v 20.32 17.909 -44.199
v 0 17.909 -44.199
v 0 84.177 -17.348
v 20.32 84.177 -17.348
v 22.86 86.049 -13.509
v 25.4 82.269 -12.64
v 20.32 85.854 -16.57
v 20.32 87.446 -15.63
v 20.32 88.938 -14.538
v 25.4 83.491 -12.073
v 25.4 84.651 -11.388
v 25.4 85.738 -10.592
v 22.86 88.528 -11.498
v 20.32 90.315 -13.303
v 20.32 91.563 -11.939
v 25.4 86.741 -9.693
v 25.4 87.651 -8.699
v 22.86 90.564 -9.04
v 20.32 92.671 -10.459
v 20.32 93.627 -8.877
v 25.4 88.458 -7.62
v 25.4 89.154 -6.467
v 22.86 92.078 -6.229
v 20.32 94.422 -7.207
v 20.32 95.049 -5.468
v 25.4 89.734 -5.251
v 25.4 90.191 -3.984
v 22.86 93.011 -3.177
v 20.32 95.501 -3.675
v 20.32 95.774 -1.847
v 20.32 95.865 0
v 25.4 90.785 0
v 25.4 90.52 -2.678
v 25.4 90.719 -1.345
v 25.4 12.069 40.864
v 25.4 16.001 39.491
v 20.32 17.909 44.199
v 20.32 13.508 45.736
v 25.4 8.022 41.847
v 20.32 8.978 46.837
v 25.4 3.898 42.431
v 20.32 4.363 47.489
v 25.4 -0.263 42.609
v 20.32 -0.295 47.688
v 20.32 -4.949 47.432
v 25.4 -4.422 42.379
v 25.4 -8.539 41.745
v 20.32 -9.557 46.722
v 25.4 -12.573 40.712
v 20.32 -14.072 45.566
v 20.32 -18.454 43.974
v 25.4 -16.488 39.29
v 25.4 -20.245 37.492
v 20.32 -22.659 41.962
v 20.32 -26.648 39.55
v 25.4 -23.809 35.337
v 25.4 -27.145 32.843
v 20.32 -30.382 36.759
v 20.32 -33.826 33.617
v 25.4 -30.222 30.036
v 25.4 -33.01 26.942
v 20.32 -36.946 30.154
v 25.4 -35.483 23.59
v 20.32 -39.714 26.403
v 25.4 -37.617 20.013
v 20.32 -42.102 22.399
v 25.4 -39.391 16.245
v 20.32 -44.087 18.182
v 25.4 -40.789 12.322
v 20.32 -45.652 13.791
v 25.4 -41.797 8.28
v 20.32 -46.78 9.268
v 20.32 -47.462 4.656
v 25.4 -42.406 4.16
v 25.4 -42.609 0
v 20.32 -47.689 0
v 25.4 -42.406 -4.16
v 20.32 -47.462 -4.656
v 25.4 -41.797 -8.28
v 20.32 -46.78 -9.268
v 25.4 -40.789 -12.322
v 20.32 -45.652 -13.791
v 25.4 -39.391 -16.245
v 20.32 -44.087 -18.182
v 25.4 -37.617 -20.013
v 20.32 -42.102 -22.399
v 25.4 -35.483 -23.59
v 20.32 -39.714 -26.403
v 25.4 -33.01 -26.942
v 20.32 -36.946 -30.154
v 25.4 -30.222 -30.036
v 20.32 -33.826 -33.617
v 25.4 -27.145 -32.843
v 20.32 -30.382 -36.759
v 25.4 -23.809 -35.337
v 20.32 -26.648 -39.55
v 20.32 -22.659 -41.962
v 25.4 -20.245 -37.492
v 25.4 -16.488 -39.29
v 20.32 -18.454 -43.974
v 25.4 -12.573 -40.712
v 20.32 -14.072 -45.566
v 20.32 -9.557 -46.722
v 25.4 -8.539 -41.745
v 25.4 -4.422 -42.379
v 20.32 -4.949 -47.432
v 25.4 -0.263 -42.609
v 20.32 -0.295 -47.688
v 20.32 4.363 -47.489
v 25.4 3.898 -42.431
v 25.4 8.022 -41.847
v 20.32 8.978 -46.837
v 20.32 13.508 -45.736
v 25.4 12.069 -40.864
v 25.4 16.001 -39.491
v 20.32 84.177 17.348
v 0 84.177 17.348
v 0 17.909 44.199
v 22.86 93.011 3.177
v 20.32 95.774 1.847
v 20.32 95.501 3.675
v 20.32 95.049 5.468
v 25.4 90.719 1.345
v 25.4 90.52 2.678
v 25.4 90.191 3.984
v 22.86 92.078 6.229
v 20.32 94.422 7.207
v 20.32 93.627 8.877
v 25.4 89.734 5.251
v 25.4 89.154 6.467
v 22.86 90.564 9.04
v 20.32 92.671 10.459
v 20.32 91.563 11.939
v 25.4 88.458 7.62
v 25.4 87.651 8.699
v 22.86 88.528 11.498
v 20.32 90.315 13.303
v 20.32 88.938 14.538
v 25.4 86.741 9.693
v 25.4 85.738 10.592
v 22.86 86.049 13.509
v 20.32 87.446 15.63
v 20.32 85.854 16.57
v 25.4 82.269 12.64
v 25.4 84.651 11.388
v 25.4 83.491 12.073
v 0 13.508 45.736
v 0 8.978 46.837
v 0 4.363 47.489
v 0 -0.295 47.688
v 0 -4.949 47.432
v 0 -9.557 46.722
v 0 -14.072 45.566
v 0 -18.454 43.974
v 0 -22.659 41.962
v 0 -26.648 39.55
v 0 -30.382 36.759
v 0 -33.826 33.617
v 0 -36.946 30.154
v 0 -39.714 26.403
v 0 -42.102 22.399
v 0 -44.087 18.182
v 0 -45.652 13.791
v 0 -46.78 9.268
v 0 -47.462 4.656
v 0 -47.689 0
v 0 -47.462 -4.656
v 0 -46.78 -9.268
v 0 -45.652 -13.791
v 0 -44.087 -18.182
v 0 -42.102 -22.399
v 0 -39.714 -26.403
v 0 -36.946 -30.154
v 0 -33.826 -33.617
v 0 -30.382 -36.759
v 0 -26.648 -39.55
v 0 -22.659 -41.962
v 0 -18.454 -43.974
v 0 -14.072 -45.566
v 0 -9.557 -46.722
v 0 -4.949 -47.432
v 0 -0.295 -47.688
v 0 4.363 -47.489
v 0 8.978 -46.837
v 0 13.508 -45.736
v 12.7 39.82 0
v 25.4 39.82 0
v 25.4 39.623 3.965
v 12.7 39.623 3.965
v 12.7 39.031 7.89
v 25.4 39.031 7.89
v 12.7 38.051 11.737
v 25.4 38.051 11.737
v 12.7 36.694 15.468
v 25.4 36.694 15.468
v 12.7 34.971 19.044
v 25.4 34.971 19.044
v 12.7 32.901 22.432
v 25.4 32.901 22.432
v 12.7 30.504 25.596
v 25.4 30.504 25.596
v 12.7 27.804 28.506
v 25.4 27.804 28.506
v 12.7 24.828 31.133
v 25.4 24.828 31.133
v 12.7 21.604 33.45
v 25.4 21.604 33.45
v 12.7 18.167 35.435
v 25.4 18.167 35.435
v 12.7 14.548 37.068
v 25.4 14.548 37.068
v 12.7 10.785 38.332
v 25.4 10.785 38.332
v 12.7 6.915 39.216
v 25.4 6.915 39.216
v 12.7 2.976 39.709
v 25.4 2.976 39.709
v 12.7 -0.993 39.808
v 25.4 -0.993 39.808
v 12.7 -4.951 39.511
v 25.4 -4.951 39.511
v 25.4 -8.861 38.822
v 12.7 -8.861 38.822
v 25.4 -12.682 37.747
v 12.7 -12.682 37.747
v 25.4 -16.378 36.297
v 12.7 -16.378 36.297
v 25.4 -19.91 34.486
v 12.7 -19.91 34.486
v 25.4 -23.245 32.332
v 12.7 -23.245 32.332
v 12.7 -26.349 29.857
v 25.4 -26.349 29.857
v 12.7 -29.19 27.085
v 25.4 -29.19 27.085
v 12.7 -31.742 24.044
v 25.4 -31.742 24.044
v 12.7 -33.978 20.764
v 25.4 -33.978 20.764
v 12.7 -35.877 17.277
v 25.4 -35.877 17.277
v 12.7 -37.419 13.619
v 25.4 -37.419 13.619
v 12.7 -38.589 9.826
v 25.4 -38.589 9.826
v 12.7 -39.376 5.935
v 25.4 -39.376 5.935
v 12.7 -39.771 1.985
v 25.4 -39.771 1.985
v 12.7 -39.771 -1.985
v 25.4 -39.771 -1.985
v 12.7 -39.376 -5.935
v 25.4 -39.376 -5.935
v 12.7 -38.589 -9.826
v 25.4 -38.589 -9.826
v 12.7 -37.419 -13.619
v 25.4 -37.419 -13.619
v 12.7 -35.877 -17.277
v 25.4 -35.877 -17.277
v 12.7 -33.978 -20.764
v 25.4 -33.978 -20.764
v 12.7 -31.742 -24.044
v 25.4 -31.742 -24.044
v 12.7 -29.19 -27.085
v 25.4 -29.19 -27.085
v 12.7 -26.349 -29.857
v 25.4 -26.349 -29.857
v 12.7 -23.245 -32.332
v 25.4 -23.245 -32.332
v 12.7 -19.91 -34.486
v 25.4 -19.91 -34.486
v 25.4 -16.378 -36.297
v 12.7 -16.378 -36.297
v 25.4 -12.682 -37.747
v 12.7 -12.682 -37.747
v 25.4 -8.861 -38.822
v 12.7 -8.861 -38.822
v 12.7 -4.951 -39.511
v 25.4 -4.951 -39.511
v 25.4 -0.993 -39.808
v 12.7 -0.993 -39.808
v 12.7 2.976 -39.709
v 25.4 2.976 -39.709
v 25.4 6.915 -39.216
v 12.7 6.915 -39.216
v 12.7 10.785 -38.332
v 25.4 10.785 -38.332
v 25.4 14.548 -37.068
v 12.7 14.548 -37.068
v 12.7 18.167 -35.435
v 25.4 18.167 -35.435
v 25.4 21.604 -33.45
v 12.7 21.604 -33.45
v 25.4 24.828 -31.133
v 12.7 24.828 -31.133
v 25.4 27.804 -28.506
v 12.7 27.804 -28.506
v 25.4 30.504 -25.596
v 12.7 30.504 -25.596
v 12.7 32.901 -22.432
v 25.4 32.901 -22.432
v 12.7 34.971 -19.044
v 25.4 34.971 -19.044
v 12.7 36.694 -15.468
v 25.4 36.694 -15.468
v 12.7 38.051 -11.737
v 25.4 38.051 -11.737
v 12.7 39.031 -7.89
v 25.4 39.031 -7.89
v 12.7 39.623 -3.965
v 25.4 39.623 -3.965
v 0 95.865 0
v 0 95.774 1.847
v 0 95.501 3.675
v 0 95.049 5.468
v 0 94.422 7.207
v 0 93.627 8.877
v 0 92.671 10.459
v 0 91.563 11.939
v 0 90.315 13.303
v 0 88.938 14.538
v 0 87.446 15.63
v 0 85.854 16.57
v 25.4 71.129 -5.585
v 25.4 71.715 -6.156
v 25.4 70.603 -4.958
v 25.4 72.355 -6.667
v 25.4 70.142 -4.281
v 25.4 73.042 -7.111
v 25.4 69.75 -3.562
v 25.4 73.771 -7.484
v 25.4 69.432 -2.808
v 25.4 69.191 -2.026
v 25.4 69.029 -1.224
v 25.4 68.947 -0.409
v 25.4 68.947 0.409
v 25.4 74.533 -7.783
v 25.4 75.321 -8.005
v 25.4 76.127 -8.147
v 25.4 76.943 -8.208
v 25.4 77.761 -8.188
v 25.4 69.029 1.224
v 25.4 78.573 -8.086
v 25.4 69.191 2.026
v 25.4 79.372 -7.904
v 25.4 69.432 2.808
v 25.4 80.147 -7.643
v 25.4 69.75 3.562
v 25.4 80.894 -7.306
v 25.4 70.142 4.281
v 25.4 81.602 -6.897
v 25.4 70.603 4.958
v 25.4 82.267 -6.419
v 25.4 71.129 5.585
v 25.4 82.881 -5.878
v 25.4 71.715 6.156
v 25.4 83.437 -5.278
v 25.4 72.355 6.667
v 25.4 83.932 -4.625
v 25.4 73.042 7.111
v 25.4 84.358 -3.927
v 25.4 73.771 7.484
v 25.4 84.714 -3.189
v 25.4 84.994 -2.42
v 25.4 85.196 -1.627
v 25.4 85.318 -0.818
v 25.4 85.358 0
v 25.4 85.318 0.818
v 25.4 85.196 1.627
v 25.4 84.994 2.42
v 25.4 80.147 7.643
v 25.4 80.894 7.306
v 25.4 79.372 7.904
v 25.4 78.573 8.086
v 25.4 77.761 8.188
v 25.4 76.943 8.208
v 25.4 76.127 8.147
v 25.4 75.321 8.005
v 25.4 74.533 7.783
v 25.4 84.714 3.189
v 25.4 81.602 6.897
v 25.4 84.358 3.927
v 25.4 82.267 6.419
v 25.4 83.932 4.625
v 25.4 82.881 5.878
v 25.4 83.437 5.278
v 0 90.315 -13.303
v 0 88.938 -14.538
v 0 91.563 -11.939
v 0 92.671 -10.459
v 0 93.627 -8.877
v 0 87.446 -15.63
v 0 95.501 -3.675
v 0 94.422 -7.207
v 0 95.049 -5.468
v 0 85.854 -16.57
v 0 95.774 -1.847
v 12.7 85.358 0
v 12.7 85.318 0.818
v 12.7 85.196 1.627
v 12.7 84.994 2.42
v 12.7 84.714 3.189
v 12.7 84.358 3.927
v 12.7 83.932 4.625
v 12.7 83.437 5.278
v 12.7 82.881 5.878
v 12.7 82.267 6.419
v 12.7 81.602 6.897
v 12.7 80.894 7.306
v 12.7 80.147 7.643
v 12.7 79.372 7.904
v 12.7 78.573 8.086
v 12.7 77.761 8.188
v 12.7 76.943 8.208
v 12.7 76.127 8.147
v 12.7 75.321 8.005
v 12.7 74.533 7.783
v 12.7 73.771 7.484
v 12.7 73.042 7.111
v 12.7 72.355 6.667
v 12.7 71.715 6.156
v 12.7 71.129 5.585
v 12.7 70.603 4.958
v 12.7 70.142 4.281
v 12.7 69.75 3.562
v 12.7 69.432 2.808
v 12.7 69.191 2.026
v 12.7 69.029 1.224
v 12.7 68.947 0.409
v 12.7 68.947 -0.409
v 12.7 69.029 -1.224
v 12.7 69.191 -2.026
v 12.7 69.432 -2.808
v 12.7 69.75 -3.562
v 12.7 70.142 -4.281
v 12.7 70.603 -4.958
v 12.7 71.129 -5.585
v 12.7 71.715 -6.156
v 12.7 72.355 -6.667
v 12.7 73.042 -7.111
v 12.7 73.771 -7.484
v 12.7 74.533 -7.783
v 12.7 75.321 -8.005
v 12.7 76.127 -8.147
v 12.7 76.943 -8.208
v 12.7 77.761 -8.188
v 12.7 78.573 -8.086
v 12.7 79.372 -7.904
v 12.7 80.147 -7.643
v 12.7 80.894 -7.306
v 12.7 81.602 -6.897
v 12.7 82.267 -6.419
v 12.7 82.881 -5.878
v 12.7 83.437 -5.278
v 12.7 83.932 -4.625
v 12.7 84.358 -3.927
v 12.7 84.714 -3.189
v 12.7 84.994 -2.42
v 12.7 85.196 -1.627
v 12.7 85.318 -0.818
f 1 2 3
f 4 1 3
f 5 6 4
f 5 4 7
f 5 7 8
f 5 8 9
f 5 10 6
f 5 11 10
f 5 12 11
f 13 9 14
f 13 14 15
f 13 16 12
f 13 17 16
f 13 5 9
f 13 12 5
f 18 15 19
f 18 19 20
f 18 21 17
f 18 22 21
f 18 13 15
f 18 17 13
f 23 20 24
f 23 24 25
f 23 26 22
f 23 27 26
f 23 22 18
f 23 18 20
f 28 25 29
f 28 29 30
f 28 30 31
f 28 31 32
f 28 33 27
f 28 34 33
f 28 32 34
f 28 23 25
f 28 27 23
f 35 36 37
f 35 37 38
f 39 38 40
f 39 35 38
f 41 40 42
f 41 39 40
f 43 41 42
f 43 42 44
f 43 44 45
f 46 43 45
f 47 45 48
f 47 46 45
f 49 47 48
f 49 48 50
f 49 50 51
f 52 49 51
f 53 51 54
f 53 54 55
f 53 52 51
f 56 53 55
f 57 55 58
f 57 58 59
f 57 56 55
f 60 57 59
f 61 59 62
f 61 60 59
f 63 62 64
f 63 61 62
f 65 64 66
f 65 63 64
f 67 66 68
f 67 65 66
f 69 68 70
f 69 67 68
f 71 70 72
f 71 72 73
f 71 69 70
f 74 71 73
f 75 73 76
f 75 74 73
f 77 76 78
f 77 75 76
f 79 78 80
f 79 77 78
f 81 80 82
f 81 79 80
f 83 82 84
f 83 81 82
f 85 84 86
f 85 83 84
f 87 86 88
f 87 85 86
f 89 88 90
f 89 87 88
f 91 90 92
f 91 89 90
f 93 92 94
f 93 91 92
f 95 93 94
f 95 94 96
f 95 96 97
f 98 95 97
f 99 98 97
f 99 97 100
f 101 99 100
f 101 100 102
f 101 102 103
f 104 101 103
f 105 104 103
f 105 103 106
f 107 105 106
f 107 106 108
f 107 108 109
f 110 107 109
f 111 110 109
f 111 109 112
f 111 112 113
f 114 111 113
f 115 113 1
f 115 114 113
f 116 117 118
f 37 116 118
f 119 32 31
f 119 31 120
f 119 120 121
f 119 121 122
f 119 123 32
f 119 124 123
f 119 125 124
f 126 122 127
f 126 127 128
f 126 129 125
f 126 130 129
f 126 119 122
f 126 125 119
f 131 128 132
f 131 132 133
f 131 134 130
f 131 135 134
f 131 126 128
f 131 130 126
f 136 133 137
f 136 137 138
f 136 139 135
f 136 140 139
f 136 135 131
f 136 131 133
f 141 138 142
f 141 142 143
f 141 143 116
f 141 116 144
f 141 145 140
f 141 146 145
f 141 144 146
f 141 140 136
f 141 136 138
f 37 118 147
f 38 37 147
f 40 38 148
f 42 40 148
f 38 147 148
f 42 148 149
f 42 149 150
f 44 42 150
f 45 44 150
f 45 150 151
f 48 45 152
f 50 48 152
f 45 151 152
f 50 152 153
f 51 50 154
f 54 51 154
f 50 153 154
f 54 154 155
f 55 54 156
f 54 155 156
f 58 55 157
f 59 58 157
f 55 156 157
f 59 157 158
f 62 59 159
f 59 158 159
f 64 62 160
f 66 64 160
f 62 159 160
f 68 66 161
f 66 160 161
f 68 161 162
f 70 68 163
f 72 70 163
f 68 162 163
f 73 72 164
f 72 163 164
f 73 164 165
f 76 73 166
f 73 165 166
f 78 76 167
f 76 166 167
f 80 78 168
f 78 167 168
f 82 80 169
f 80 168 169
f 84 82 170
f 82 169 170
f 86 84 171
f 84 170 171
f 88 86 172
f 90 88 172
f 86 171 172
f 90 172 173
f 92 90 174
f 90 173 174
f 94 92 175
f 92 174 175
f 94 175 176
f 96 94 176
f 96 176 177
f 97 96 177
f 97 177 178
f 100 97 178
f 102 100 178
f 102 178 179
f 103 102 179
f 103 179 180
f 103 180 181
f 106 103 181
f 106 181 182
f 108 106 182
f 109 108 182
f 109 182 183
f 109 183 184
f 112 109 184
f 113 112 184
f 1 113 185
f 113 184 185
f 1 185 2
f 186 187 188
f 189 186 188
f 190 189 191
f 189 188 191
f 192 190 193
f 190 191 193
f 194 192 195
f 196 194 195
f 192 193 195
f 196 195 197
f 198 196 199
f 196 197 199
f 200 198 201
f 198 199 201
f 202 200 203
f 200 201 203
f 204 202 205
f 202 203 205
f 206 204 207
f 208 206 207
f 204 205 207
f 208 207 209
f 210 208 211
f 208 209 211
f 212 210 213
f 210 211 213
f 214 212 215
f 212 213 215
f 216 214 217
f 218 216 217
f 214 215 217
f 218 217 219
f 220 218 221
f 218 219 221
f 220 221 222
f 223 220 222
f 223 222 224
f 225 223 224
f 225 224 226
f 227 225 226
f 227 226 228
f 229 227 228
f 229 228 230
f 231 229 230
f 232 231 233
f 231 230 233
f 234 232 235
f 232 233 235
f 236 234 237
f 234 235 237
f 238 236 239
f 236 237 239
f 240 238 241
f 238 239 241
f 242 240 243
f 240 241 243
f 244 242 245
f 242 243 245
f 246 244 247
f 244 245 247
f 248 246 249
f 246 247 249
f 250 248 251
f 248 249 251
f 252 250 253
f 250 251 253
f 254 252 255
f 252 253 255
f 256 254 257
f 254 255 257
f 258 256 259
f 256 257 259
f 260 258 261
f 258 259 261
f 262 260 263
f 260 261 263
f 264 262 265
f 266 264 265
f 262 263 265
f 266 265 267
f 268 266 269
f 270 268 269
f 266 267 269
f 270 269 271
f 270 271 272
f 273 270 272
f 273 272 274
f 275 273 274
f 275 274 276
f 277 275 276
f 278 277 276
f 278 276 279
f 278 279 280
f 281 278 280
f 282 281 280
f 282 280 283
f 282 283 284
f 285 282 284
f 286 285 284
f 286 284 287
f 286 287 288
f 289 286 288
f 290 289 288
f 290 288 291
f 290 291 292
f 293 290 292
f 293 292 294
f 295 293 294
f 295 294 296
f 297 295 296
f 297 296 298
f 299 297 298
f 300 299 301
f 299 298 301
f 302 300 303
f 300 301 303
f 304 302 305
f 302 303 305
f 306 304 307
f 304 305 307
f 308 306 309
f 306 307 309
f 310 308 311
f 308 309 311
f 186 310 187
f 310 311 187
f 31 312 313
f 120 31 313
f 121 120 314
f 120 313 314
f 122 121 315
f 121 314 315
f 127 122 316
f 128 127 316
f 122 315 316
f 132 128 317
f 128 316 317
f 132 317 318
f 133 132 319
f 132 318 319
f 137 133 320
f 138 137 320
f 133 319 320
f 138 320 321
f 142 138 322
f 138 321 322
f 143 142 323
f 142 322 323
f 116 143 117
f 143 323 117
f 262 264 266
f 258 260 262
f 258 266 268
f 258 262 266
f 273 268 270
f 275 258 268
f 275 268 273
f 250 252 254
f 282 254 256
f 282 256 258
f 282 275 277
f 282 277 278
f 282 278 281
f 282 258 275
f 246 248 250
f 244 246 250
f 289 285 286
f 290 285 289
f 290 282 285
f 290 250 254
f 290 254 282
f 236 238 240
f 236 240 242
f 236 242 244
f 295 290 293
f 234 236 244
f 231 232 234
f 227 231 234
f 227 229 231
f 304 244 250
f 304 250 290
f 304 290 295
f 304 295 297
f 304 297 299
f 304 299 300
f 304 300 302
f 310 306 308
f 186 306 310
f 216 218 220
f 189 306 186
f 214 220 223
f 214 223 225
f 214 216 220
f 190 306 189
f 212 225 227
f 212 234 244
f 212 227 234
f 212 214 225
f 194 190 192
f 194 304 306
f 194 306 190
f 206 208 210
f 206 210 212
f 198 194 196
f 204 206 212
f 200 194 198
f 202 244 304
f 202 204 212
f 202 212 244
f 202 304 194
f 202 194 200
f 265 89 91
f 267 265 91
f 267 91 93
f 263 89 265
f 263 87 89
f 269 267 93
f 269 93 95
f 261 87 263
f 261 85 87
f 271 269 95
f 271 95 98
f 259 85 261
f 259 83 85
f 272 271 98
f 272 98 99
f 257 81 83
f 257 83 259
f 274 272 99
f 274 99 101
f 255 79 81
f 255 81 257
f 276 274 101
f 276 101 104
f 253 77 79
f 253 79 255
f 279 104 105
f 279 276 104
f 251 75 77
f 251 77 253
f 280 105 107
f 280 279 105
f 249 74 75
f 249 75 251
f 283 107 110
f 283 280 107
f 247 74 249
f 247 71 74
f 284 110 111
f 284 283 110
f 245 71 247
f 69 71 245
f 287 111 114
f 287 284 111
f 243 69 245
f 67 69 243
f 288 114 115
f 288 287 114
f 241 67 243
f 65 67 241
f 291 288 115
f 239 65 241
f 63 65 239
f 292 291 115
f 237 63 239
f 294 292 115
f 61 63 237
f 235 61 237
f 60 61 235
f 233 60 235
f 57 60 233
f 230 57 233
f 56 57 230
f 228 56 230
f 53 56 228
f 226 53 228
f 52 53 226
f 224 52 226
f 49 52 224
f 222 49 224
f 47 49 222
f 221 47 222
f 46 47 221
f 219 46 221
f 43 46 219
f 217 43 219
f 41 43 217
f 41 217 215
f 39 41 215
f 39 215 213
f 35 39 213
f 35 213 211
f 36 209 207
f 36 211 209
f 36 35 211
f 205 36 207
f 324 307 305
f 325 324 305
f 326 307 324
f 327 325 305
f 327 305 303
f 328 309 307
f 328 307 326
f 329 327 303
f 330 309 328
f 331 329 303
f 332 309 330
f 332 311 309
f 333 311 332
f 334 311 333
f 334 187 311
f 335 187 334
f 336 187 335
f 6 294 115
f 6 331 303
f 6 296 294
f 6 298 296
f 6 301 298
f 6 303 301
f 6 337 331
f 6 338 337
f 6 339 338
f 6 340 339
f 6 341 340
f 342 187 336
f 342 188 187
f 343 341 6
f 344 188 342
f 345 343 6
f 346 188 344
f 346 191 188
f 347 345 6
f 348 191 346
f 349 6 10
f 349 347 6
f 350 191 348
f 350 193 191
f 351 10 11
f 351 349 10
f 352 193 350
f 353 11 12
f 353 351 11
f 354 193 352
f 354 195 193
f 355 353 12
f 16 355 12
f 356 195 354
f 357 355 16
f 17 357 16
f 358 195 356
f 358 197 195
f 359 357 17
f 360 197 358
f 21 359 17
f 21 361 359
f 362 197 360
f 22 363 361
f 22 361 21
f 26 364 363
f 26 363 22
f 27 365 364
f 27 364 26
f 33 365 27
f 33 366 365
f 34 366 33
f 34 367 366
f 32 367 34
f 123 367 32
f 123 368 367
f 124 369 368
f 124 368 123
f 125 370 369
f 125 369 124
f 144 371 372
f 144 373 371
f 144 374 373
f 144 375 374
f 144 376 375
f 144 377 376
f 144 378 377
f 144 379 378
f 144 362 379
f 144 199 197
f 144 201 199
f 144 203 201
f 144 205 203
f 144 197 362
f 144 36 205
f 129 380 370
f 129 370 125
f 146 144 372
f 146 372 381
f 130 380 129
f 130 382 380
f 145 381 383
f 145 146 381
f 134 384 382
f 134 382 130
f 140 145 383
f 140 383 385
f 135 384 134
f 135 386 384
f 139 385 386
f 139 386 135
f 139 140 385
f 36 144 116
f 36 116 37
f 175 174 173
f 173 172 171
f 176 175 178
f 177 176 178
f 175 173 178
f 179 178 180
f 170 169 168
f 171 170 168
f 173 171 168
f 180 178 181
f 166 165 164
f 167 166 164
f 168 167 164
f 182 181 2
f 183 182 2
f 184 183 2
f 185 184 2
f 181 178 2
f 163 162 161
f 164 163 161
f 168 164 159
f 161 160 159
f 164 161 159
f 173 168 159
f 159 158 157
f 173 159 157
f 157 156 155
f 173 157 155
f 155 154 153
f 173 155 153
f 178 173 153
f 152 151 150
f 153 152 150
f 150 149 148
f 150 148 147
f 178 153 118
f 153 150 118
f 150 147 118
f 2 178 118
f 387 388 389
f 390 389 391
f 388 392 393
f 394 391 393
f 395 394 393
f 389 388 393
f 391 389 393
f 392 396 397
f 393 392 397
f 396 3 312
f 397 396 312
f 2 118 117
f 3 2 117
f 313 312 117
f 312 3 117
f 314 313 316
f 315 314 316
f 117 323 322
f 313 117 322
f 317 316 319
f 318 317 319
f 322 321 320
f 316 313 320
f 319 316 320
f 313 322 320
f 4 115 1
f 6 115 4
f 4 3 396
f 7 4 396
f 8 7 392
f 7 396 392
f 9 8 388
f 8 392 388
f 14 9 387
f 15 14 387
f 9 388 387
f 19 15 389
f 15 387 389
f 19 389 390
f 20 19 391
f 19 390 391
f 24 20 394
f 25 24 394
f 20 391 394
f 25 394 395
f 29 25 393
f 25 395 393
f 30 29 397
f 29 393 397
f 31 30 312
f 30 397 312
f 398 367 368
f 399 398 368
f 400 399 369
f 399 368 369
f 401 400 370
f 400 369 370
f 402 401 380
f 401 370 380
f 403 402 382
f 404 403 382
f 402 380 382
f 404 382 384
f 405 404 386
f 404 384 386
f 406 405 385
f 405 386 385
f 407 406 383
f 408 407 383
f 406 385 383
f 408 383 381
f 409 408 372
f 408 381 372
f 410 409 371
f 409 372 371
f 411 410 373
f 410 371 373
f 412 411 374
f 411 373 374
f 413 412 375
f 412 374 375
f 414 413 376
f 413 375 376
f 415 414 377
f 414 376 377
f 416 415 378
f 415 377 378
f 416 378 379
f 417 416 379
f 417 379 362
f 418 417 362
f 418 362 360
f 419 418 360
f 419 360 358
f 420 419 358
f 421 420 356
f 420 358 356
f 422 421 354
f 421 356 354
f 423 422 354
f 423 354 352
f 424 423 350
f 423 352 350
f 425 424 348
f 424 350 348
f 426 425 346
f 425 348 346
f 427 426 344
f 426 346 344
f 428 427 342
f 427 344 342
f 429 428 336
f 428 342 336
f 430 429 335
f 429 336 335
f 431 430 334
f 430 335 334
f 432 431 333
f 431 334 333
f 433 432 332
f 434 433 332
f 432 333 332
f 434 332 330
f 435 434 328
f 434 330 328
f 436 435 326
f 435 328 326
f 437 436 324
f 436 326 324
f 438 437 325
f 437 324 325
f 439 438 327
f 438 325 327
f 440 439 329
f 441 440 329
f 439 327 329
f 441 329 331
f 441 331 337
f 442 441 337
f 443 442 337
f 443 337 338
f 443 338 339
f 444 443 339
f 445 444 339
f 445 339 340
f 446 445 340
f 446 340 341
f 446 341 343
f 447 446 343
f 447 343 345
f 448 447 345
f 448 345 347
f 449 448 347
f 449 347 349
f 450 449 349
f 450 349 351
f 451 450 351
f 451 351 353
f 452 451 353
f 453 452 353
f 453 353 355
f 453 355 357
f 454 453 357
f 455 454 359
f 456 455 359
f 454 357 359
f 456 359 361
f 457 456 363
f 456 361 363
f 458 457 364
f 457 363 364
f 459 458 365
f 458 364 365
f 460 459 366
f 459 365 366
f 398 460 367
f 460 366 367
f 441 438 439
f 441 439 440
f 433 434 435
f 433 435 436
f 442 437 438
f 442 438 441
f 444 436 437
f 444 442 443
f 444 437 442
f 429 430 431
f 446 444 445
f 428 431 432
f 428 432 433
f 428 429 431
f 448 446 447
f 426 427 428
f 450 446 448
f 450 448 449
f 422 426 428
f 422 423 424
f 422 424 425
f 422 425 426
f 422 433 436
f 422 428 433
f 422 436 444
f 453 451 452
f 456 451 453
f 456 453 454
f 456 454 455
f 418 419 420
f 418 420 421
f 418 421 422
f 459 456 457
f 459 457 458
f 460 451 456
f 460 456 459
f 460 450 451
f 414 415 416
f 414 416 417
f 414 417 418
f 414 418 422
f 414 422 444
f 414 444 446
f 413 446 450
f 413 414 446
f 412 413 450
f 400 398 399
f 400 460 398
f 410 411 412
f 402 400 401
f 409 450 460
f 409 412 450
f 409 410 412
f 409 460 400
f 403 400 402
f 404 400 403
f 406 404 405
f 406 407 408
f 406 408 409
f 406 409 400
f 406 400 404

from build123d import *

# Parameters (mm, degrees)
F1_DEPTH = 25.4
F2_R     = 39.820498
F3_DEPTH = 12.7
F4_R     = 8.210642
F5_DEPTH = 12.7
F6_SIZE  = 5.08


with BuildPart() as f1:
    # F0 (on Right) → F1 (new body)
    with BuildSketch(Plane.YZ):
        with BuildLine():
            ThreePointArc((17.909064, -44.198928), (39.549668, -26.647768), (47.68941, 0))
            ThreePointArc((47.68941, 0), (39.549668, 26.647768), (17.909064, 44.198928))
            ThreePointArc((17.909064, 44.198928), (-47.68941, 0), (17.909064, -44.198928))
        make_face()
        with BuildLine():
            ThreePointArc((17.909064, 44.198928), (39.549668, 26.647768), (47.68941, 0))
            ThreePointArc((47.68941, 0), (39.549668, -26.647768), (17.909064, -44.198928))
            Line((17.909064, -44.198928), (84.17689, -17.347717))
            ThreePointArc((84.17689, -17.347717), (58.430027, 0), (84.17689, 17.347717))
            Line((84.17689, 17.347717), (17.909064, 44.198928))
        make_face()
        with BuildLine():
            ThreePointArc((95.865432, 0), (92.67065, 10.459031), (84.17689, 17.347717))
            ThreePointArc((84.17689, 17.347717), (58.430027, 0), (84.17689, -17.347717))
            ThreePointArc((84.17689, -17.347717), (92.67065, -10.459031), (95.865432, 0))
        make_face()
    extrude(amount=F1_DEPTH)

    # F2 (on face) → F3 (cut)
    with BuildSketch(Plane.YZ.offset(25.4)):
        Circle(F2_R)
    extrude(amount=-F3_DEPTH, mode=Mode.SUBTRACT)

    # F4 (on face) → F5 (cut)
    with BuildSketch(Plane.YZ.offset(25.4)):
        with Locations((77.147729, 0)):
            Circle(F4_R)
    extrude(amount=-F5_DEPTH, mode=Mode.SUBTRACT)

    # F6
    f6_edges = [f1.edges().sort_by_distance(p)[0] for p in [
        (25.4, 51.042977, 30.773322),
    ]]
    chamfer(f6_edges, length=F6_SIZE)


solid = f1.part
